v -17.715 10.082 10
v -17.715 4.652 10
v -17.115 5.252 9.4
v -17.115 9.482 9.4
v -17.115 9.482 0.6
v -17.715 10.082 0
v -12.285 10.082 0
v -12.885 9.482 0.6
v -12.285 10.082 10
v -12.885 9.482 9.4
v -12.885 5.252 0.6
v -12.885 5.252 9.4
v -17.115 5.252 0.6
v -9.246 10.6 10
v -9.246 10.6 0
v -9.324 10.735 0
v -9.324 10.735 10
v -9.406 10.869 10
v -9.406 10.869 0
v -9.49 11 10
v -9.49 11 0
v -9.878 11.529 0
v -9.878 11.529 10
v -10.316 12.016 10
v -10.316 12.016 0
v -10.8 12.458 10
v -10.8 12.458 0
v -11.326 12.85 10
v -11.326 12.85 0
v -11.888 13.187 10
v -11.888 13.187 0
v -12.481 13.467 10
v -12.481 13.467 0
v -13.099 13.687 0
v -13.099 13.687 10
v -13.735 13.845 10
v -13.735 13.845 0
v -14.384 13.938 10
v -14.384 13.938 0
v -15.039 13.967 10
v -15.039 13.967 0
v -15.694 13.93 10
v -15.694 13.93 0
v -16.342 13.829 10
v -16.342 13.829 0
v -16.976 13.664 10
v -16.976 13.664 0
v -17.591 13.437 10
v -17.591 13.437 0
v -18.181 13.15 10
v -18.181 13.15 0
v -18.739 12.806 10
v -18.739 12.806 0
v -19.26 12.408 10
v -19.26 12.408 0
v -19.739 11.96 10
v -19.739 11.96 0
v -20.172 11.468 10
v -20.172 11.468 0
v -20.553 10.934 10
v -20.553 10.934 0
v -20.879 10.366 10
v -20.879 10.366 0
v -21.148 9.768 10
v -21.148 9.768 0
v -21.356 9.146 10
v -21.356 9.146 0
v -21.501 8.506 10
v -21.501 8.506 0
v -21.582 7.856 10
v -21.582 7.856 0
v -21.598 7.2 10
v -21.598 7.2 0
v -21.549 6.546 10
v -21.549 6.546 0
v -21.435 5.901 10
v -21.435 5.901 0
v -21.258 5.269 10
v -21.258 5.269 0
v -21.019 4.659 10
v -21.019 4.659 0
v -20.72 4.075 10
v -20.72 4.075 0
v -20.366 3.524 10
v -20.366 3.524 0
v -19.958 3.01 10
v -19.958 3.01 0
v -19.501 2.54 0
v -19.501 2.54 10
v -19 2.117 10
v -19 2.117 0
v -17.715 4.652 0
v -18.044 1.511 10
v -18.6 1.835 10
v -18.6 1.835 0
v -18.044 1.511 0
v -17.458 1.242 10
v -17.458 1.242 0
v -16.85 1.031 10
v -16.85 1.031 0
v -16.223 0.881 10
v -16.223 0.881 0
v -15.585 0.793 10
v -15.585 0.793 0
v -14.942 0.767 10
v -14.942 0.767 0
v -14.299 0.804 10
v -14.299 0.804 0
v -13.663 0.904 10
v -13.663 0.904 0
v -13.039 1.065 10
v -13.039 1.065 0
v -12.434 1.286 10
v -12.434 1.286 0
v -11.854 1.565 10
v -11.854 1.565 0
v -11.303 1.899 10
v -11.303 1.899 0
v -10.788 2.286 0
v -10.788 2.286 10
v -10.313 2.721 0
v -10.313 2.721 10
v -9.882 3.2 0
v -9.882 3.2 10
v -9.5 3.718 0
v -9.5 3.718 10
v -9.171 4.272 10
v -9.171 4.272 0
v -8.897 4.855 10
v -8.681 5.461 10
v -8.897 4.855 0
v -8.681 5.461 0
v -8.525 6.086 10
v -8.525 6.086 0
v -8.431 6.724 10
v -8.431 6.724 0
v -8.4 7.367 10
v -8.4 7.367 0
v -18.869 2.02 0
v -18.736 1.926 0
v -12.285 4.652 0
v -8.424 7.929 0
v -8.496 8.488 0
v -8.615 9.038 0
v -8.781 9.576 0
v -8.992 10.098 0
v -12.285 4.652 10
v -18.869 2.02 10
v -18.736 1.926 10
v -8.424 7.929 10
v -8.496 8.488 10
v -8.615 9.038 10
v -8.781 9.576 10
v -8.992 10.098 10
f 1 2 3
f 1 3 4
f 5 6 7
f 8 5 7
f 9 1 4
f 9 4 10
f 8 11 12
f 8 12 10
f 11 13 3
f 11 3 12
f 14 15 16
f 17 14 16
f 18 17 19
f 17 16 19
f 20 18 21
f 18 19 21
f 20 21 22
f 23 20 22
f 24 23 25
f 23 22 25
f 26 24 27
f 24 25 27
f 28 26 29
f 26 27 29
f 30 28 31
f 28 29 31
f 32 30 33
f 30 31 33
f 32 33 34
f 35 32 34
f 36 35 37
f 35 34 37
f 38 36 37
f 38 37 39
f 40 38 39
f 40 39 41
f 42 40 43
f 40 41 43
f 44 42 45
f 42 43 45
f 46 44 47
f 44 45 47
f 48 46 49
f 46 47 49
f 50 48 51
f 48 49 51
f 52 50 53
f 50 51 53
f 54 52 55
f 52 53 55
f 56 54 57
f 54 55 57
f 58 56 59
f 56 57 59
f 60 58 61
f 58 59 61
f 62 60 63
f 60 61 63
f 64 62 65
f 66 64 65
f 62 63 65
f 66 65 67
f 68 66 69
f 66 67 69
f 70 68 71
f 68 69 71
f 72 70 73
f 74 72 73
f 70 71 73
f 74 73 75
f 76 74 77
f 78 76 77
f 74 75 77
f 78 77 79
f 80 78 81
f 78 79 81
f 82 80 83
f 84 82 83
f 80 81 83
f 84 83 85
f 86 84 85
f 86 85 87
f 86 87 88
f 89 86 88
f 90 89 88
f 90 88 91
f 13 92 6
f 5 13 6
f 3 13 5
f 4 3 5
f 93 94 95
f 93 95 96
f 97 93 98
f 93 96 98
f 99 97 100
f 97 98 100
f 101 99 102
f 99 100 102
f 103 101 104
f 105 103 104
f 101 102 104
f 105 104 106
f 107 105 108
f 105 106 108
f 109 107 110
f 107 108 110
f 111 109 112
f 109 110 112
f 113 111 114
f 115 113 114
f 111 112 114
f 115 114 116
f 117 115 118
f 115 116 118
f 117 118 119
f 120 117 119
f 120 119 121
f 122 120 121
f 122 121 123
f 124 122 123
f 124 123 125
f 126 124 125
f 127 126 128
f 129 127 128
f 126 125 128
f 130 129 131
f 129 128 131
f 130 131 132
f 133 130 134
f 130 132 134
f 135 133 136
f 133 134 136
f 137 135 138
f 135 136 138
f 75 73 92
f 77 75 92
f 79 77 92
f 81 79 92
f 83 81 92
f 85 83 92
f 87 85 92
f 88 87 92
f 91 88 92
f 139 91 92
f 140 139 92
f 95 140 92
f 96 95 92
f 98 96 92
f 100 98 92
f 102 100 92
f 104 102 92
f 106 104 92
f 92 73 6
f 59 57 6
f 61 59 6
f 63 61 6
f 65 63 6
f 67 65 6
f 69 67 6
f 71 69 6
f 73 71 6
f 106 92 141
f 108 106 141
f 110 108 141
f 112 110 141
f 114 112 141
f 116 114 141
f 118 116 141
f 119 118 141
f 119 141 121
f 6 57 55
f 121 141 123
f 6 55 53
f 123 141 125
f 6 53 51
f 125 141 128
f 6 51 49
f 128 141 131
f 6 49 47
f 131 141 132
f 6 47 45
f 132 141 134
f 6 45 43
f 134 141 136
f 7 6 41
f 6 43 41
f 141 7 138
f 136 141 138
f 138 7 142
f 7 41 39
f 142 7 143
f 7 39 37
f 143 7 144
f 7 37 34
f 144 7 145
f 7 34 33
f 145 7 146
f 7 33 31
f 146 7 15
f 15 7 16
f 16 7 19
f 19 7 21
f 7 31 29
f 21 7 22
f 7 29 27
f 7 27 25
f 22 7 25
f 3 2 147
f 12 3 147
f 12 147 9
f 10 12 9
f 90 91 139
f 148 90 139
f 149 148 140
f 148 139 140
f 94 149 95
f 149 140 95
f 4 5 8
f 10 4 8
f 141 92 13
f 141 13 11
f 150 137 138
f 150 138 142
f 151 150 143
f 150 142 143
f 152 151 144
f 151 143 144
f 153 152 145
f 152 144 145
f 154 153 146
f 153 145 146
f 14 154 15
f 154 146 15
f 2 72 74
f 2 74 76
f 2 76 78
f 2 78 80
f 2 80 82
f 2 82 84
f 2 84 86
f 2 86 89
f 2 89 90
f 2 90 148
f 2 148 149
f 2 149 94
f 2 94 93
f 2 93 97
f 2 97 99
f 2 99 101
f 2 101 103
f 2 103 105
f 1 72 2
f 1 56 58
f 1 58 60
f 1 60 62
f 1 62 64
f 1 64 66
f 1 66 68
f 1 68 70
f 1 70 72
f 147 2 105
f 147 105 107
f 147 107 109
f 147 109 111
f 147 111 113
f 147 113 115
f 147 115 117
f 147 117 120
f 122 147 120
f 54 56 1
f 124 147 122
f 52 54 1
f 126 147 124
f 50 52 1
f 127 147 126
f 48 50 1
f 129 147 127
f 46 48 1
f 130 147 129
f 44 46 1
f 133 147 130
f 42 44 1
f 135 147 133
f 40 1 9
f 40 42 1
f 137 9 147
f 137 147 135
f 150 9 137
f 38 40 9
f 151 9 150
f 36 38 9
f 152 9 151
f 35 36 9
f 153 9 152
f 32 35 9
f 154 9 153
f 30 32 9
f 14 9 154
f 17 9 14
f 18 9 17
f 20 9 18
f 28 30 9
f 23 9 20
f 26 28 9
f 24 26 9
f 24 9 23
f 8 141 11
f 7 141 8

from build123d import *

# Parameters (mm, degrees)
F0_W     = 4.23
F0_H     = 4.23
F1_DEPTH = 10
F2_SIZE  = 0.6


# Not quite as in the source:
# - two fillets or chamfers of one size are made in one step


with BuildPart() as f1:
    # F0 (on Top) → F1 (new body)
    with BuildSketch(Plane.XY):
        with BuildLine():
            Line((-18.6, 10.6), (-9.2461221228, 10.6))
            ThreePointArc((-9.2461221228, 10.6), (-9.3644866857, 10.802164009), (-9.4899513299, 11))
            Line((-9.4899513299, 11), (-19, 11))
            Line((-19, 11), (-19, 2.1171452511))
            ThreePointArc((-19, 2.1171452511), (-18.8026143682, 1.9724540765), (-18.6, 1.8351804761))
            Line((-18.6, 1.8351804761), (-18.6, 10.6))
        make_face()
        with BuildLine():
            Line((-19, 11), (-9.4899513299, 11))
            ThreePointArc((-9.4899513299, 11), (-19.5051458211, 12.1901489162), (-19, 2.1171452511))
            Line((-19, 2.1171452511), (-19, 11))
        make_face()
        with BuildLine():
            ThreePointArc((-18.6, 1.8351804761), (-11.8535734555, 1.5651832687), (-8.4, 7.3669071504))
            ThreePointArc((-8.4, 7.3669071504), (-8.6150335165, 9.0378957815), (-9.2461221228, 10.6))
            Line((-9.2461221228, 10.6), (-18.6, 10.6))
            Line((-18.6, 10.6), (-18.6, 1.8351804761))
        make_face()
        with Locations((-15, 7.3669071504)):
            Rectangle(F0_W, F0_H, mode=Mode.SUBTRACT)
    extrude(amount=F1_DEPTH)

    # F2
    f2_edges = [f1.edges().sort_by_distance(p)[0] for p in [
        (-17.115, 7.366907, 10),
        (-15, 5.251907, 10),
        (-12.885, 7.366907, 10),
        (-15, 9.481907, 10),
        (-17.115, 7.366907, 0),
        (-15, 9.481907, 0),
        (-12.885, 7.366907, 0),
        (-15, 5.251907, 0),
    ]]
    chamfer(f2_edges, length=F2_SIZE)


solid = f1.part
